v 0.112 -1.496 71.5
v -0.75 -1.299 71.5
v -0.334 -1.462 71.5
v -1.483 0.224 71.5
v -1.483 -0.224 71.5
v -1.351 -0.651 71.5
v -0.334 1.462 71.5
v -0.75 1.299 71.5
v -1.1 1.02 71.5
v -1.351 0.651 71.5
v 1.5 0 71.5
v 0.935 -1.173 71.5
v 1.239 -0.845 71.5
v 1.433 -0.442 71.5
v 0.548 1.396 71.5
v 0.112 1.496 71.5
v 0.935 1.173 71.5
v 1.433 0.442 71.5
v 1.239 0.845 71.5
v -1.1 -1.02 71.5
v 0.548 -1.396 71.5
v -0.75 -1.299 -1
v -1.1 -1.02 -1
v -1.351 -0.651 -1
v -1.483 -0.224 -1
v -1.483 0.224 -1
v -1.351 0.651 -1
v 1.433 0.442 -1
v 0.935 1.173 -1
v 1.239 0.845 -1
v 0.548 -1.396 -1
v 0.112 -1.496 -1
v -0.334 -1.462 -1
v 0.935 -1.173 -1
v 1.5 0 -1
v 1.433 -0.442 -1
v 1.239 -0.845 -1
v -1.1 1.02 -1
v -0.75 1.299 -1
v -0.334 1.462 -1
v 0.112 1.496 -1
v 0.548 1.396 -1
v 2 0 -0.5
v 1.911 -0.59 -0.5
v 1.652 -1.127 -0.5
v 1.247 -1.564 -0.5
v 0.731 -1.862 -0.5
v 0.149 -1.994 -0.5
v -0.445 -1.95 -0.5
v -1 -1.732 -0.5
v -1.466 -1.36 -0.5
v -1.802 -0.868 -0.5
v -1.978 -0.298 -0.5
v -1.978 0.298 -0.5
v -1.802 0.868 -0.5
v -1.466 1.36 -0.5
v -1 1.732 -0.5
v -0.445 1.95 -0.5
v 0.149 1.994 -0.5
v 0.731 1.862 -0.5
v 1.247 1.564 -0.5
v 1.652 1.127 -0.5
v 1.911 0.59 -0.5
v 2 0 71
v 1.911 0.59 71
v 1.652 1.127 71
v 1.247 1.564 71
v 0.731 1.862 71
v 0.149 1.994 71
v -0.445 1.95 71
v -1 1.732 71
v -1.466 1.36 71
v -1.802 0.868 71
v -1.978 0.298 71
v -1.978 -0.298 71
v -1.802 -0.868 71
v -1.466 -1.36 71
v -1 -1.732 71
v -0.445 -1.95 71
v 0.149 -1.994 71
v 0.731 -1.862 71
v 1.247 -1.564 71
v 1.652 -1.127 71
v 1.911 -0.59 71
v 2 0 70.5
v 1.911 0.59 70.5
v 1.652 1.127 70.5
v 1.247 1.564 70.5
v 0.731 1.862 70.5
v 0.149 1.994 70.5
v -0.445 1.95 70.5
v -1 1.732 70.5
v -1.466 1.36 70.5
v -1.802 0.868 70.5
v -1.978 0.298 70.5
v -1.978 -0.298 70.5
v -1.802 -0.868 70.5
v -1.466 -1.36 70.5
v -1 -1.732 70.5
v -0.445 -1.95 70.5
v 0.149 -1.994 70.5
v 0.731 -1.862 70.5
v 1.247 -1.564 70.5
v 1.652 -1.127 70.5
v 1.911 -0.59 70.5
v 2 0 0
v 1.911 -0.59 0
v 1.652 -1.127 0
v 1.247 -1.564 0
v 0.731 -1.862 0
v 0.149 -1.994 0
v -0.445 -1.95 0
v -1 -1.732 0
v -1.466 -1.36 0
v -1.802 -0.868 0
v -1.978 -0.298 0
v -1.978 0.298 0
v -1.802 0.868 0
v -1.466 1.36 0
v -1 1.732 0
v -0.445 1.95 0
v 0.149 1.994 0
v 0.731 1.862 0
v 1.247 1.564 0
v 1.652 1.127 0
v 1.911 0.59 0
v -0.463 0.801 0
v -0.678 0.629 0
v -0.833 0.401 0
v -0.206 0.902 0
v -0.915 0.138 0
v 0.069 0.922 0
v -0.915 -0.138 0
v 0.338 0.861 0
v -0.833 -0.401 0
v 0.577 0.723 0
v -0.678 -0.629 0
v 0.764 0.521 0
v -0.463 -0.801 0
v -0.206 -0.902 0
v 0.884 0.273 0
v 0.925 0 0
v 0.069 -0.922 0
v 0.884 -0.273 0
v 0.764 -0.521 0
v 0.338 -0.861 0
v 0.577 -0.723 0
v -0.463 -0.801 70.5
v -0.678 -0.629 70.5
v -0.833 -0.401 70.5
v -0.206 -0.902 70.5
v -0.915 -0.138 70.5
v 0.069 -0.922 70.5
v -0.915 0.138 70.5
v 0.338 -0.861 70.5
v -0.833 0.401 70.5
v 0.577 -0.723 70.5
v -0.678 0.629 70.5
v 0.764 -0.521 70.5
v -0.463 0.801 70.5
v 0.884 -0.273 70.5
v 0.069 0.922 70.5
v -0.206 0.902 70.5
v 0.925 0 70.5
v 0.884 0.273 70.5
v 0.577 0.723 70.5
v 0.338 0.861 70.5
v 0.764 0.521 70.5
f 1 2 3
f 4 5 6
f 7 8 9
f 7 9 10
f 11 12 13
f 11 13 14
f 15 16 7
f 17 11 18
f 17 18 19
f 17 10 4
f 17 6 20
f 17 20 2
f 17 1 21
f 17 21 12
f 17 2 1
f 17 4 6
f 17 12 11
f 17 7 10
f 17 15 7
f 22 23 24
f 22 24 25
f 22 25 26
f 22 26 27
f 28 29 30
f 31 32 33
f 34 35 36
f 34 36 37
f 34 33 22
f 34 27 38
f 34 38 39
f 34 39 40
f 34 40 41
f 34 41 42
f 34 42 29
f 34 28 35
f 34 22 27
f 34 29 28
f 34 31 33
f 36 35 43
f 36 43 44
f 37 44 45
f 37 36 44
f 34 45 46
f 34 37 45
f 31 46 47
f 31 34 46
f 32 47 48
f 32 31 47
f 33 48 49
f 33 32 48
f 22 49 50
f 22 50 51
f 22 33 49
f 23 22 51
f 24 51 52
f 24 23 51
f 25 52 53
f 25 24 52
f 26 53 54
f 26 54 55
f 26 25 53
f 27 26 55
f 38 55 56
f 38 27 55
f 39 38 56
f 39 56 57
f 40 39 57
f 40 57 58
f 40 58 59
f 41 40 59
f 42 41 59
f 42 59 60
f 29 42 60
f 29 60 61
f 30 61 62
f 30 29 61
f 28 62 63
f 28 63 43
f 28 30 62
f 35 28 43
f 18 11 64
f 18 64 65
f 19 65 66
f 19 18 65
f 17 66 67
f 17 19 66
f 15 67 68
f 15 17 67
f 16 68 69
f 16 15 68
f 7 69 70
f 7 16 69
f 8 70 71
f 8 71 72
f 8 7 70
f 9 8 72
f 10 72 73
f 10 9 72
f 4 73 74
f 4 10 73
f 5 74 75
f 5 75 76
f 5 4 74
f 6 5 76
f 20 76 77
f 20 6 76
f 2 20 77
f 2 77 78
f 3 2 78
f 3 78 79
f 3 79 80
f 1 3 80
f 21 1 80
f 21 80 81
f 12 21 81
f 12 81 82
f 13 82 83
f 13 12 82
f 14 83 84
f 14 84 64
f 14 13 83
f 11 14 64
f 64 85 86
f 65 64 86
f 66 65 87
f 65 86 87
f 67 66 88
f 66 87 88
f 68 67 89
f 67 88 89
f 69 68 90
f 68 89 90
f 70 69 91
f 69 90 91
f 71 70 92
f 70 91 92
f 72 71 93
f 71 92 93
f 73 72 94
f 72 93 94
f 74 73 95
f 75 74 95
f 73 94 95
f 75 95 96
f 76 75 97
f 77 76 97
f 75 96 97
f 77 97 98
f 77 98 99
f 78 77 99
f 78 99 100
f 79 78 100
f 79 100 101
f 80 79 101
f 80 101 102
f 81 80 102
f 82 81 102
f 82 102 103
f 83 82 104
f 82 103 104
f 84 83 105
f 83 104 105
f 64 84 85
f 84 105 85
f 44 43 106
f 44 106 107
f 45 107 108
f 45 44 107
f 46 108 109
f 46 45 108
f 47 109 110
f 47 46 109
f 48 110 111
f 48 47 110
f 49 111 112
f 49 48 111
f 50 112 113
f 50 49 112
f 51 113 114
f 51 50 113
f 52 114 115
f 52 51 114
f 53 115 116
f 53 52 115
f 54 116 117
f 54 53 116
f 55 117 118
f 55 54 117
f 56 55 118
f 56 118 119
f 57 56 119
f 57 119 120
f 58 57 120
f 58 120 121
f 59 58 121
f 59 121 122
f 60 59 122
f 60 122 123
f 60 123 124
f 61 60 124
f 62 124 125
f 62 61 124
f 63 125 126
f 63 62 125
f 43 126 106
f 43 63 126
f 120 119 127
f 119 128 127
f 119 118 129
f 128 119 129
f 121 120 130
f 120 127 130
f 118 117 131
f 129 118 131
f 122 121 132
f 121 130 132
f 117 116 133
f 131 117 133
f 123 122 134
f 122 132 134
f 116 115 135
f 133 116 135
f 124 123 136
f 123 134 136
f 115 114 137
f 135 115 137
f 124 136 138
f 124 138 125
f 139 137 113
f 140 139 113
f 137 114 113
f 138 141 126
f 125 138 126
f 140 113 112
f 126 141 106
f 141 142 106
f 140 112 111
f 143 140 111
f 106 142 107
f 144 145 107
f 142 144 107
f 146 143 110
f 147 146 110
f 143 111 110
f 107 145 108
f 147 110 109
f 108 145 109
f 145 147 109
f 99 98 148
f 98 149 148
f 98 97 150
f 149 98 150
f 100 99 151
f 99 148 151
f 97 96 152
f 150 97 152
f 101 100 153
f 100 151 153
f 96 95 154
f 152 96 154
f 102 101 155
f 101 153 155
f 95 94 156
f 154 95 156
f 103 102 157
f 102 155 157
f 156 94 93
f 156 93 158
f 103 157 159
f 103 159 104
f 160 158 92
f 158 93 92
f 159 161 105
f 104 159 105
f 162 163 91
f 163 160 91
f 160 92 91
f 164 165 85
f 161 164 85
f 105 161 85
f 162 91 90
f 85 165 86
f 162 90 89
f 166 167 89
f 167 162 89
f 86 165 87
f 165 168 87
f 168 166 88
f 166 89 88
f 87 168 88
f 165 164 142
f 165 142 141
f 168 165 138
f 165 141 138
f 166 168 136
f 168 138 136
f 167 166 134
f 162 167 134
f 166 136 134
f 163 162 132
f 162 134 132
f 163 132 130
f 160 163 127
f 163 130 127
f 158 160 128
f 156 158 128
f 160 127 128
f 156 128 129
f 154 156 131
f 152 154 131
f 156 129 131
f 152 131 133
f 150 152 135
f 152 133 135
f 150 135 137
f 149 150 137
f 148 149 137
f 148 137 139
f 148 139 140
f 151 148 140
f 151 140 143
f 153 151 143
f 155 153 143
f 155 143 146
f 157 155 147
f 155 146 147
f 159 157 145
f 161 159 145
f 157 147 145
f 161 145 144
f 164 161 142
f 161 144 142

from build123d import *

# Parameters (mm, degrees)
SKETCH_1_R      = 0.925
EXTRUDE_1_DEPTH = 70.5
SKETCH_2_R      = 2
EXTRUDE_2_DEPTH = 1
EXTRUDE_START   = 1
SKETCH_3_R      = 2
EXTRUDE_3_DEPTH = 1
CHAMFER_1_SIZE  = 0.5
CHAMFER_2_SIZE  = 0.5


with BuildPart() as part:
    # 스케치1 → 보스-돌출1 (new body)
    with BuildSketch(Plane.XY):
        Circle(SKETCH_1_R)
    extrude(amount=EXTRUDE_1_DEPTH)

    # 스케치2 → 보스-돌출2 (add)
    with BuildSketch(Plane.XY.offset(70.5)):
        Circle(SKETCH_2_R)
    extrude(amount=EXTRUDE_2_DEPTH)

    # 스케치3 → 보스-돌출3 (add)
    with BuildSketch(Plane(origin=(0, 0, 0), x_dir=(-1, 0, 0), z_dir=(0, 0, -1)).offset(EXTRUDE_START)):
        with Locations(Location((0, 0, 0), (0, 0, 180))):
            Circle(SKETCH_3_R)
    extrude(amount=-EXTRUDE_3_DEPTH)

    # 모따기1
    chamfer_1_edges = [part.edges().sort_by_distance(p)[0] for p in [
        (-2, 0, 71.5),
    ]]
    chamfer(chamfer_1_edges, length=CHAMFER_1_SIZE)

    # 모따기2
    chamfer_2_edges = [part.edges().sort_by_distance(p)[0] for p in [
        (-2, 0, -1),
    ]]
    chamfer(chamfer_2_edges, length=CHAMFER_2_SIZE)


solid = part.part
